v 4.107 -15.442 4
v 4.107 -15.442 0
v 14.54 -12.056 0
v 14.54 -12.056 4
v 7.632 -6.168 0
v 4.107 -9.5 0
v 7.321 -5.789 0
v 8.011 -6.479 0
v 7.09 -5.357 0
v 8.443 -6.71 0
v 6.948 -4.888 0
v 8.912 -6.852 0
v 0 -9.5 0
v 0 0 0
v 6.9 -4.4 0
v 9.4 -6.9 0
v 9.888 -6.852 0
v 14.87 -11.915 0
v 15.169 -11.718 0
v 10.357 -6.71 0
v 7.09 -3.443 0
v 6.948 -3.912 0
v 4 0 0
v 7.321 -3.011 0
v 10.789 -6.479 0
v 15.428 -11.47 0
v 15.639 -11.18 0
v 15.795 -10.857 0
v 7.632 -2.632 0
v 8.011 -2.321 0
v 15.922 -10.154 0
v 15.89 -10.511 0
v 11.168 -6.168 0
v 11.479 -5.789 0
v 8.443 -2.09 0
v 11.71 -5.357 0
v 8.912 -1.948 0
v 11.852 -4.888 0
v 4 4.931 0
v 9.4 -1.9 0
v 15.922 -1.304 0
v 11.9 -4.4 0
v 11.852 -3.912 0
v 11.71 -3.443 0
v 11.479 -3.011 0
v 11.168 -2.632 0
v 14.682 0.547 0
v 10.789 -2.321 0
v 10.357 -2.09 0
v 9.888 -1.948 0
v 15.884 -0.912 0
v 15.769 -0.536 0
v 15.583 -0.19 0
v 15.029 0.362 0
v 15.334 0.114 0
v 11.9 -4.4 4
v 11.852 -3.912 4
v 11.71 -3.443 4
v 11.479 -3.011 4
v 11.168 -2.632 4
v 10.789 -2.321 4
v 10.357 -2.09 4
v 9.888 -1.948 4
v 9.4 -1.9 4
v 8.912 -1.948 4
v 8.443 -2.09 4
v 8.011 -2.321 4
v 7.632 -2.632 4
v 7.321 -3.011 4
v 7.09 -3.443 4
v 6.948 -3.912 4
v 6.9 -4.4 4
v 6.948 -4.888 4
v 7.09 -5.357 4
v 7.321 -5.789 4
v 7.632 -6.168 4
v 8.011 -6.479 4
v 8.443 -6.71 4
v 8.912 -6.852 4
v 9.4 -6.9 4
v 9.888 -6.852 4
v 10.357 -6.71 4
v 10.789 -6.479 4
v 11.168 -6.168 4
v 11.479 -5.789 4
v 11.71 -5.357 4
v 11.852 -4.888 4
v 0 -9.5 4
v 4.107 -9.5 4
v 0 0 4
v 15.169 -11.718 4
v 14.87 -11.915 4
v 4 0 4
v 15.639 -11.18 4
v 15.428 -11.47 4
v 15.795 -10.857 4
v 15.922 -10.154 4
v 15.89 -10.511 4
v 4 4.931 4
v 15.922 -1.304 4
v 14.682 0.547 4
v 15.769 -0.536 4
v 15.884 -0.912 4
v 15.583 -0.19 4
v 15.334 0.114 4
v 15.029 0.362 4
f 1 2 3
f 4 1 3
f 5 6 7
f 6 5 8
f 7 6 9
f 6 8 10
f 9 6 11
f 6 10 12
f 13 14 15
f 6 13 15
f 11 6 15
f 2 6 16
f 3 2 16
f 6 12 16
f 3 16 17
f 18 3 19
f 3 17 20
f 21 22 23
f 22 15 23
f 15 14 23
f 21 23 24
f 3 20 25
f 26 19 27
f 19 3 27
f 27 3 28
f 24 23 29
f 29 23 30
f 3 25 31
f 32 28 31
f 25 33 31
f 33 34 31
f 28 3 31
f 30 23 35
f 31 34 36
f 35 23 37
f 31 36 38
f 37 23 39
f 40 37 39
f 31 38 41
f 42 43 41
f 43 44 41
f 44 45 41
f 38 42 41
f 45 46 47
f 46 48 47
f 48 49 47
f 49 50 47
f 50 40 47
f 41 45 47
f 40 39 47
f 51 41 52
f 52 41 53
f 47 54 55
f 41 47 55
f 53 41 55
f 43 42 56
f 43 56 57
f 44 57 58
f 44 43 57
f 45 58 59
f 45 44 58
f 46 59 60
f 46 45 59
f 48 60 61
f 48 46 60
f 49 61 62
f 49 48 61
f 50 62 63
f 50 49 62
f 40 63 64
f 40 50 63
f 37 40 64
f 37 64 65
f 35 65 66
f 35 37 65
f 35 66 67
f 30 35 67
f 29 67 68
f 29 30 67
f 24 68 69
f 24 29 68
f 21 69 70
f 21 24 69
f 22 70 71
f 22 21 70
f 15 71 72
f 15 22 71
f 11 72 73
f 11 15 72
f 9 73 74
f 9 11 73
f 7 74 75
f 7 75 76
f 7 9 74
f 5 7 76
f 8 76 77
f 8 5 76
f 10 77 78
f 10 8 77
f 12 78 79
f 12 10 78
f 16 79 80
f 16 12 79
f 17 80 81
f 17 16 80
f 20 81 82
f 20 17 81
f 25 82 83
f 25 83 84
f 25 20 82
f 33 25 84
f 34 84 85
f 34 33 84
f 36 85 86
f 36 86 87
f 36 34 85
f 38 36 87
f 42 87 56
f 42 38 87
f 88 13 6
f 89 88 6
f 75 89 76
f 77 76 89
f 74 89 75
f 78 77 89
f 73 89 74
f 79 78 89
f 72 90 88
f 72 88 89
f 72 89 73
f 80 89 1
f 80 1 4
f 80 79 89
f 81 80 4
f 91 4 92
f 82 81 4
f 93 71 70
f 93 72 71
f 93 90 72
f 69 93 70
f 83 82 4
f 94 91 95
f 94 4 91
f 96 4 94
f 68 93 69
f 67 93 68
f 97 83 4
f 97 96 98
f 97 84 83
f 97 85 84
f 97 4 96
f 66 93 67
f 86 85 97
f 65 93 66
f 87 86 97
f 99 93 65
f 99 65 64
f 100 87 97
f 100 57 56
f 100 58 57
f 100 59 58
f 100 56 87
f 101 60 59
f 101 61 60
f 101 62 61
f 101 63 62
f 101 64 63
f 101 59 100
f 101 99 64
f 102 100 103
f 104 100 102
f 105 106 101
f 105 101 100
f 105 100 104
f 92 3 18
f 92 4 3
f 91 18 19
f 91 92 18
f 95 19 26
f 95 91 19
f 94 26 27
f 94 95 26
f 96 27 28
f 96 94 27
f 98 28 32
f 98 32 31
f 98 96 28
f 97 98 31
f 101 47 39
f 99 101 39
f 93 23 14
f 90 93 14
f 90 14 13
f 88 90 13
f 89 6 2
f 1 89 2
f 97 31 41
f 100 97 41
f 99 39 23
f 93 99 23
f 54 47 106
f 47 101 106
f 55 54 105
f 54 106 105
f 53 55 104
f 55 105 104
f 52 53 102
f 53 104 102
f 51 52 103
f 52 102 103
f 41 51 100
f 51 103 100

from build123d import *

# Parameters (mm, degrees)
SKETCH_1_R      = 2.5
EXTRUDE_1_DEPTH = 4
FILLET_1_R      = 2


with BuildPart() as part:
    # ｽｹｯﾁ1 → ﾎﾞｽ - 押し出し1 (new body)
    with BuildSketch(Plane.XY):
        Polygon((0, 0), (0, -9.5), (4.107330666, -9.5), (4.107330666, -15.441500508), (15.922353162, -11.607425741), (15.922353162, 0.037444009), (4, 4.930710615), (4, 0), align=None)
        with Locations((9.4, -4.4)):
            Circle(SKETCH_1_R, mode=Mode.SUBTRACT)
    extrude(amount=EXTRUDE_1_DEPTH)

    # ﾌｨﾚｯﾄ1
    fillet_1_edges = [part.edges().sort_by_distance(p)[0] for p in [
        (15.922353162, 0.037444009, 2),
        (15.922353162, -11.607425741, 2),
    ]]
    fillet(fillet_1_edges, radius=FILLET_1_R)


solid = part.part
